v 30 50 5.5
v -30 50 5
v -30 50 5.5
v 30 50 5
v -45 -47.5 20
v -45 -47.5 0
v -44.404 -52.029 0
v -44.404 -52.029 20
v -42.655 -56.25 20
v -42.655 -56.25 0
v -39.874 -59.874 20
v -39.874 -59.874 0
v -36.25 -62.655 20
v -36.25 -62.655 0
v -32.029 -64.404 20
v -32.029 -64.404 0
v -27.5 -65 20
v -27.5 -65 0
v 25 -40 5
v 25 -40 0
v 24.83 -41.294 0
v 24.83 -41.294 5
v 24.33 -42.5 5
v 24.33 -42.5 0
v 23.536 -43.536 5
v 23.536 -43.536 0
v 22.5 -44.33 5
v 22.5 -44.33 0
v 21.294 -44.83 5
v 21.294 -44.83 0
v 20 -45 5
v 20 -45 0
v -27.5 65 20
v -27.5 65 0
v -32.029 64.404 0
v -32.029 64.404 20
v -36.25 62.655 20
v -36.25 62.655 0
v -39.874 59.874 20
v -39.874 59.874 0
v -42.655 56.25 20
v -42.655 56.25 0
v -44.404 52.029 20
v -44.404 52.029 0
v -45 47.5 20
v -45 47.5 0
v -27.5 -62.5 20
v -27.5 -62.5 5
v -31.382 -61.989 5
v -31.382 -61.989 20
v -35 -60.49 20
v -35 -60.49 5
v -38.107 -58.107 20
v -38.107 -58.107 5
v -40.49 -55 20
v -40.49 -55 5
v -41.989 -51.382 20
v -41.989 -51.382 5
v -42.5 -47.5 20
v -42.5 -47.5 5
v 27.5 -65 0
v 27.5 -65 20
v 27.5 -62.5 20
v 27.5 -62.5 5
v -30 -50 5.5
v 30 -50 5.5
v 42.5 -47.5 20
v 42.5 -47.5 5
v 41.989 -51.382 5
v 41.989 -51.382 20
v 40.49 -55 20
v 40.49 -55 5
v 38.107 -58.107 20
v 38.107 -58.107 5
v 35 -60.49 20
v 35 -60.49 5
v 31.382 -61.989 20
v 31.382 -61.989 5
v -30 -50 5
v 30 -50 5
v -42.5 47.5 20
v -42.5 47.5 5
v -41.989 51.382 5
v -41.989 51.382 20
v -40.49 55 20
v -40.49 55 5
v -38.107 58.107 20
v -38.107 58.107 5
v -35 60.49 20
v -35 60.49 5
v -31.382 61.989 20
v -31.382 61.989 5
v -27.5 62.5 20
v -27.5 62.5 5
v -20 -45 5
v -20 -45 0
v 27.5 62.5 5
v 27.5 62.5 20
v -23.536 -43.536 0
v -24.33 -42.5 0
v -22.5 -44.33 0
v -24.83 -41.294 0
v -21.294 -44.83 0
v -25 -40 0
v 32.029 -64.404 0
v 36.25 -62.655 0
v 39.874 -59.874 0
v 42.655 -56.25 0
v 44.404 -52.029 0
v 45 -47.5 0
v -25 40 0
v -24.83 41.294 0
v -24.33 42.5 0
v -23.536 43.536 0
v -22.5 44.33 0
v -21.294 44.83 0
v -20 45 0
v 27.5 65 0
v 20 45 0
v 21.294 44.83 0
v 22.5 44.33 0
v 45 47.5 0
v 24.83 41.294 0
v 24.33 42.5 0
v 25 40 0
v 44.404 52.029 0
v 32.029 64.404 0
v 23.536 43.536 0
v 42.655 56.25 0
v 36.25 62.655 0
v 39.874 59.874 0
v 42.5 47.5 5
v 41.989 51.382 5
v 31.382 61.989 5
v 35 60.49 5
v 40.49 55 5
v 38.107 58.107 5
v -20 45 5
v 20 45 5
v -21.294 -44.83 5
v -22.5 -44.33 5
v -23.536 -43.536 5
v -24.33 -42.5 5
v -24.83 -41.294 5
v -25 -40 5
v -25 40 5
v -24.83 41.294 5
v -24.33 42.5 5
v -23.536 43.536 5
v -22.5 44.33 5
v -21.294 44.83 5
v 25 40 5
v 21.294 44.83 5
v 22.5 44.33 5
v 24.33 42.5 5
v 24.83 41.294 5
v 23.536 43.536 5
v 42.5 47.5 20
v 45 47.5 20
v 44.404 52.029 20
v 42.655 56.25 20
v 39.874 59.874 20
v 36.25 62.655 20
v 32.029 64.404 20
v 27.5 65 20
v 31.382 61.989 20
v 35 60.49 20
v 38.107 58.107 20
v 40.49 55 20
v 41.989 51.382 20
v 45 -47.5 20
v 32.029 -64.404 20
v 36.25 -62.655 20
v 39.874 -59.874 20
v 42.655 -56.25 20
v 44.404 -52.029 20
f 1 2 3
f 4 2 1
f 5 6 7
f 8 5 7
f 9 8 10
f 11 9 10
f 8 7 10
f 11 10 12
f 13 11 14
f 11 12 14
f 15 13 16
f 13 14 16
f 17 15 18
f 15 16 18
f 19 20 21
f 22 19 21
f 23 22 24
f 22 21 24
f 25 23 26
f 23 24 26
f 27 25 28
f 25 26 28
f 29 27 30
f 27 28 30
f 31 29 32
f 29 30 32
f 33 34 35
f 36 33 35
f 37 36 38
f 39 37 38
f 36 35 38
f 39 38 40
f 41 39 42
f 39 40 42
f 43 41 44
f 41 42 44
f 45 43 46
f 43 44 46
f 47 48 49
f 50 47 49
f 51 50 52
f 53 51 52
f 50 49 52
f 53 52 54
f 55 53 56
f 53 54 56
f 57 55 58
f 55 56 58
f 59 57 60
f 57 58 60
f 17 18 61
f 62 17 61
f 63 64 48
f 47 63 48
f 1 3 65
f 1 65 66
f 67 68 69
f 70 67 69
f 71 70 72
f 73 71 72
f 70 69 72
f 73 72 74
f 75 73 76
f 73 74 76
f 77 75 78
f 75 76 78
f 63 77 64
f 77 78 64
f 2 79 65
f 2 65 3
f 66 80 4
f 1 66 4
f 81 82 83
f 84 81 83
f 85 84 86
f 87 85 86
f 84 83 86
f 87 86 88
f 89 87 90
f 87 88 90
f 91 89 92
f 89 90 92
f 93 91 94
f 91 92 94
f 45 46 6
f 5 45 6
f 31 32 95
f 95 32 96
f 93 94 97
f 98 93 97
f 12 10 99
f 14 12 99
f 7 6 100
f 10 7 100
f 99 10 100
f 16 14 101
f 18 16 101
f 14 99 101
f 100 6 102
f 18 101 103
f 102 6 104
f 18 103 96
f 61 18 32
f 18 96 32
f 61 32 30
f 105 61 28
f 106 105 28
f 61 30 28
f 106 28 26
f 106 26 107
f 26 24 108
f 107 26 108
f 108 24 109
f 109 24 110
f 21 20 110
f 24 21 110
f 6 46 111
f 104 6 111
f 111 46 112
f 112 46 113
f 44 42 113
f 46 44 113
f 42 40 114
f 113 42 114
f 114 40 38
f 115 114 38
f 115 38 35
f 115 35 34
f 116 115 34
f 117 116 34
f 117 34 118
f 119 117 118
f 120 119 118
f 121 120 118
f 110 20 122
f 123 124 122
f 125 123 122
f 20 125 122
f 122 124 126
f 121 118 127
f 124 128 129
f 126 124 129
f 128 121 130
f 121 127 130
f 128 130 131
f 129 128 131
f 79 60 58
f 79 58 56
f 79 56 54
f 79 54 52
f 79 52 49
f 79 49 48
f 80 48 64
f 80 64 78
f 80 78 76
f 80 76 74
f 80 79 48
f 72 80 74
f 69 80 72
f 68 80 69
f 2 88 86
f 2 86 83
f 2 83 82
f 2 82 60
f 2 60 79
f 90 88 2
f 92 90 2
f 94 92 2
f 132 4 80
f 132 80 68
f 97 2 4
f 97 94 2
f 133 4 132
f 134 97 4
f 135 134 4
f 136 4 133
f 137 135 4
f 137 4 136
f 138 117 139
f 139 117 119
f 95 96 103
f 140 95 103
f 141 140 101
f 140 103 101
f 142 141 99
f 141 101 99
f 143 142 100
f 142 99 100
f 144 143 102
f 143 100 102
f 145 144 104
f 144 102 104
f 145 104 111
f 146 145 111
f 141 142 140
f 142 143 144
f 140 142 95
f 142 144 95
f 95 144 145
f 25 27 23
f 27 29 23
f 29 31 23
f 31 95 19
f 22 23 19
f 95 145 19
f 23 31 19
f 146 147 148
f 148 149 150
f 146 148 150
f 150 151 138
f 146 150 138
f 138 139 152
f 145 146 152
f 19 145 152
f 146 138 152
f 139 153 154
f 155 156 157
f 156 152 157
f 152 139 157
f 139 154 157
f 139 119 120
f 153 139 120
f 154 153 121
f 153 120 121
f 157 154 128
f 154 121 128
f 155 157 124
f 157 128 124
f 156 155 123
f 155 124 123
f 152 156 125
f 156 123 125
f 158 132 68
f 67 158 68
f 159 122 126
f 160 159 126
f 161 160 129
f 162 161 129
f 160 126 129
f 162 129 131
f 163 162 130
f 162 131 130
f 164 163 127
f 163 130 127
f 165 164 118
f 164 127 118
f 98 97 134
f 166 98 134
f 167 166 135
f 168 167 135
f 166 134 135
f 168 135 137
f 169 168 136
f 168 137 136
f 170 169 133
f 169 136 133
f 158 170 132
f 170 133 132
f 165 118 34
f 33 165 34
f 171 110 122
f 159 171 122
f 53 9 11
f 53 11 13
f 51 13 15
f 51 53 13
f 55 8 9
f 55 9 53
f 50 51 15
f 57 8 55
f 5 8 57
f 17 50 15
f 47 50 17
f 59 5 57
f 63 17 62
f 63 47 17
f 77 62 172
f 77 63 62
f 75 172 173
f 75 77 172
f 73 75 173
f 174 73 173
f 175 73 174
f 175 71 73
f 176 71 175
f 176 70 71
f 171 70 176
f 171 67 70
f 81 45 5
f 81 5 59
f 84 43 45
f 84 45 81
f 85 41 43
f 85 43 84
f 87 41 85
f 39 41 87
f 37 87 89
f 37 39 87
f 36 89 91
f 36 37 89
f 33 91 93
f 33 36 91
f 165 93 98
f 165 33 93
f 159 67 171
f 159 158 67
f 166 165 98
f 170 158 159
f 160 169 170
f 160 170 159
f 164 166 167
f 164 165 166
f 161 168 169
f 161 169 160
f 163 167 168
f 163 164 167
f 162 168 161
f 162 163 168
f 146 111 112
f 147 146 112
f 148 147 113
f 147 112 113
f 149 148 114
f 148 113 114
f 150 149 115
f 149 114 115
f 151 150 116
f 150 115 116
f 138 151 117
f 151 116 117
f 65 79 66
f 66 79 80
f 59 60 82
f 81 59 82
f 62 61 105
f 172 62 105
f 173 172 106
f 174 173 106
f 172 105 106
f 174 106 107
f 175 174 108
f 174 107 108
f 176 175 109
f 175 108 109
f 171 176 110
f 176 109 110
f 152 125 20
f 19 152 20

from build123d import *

# Parameters (mm, degrees)
F1_DEPTH = 20
F2_DEPTH = 5
F3_W     = 60
F3_H     = 100
F4_DEPTH = 0.5


with BuildPart() as f1:
    # F0 (on Top) → F1 (new body)
    with BuildSketch(Plane.XY):
        with BuildLine():
            Line((45, -47.5), (45, 47.5))
            ThreePointArc((45, 47.5), (39.874369, 59.874369), (27.5, 65))
            Line((27.5, 65), (-27.5, 65))
            ThreePointArc((-27.5, 65), (-39.874369, 59.874369), (-45, 47.5))
            Line((-45, 47.5), (-45, -47.5))
            ThreePointArc((-45, -47.5), (-39.874369, -59.874369), (-27.5, -65))
            Line((-27.5, -65), (27.5, -65))
            ThreePointArc((27.5, -65), (39.874369, -59.874369), (45, -47.5))
        make_face()
        with BuildLine():
            Line((-27.5, 62.5), (27.5, 62.5))
            ThreePointArc((27.5, 62.5), (38.106602, 58.106602), (42.5, 47.5))
            Line((42.5, 47.5), (42.5, -47.5))
            ThreePointArc((42.5, -47.5), (38.106602, -58.106602), (27.5, -62.5))
            Line((27.5, -62.5), (-27.5, -62.5))
            ThreePointArc((-27.5, -62.5), (-38.106602, -58.106602), (-42.5, -47.5))
            Line((-42.5, -47.5), (-42.5, 47.5))
            ThreePointArc((-42.5, 47.5), (-38.106602, 58.106602), (-27.5, 62.5))
        make_face(mode=Mode.SUBTRACT)
    extrude(amount=F1_DEPTH)

    # F0 (on Top) → F2 (join)
    with BuildSketch(Plane.XY):
        with BuildLine():
            ThreePointArc((42.5, 47.5), (38.106602, 58.106602), (27.5, 62.5))
            Line((27.5, 62.5), (-27.5, 62.5))
            ThreePointArc((-27.5, 62.5), (-38.106602, 58.106602), (-42.5, 47.5))
            Line((-42.5, 47.5), (-42.5, -47.5))
            ThreePointArc((-42.5, -47.5), (-38.106602, -58.106602), (-27.5, -62.5))
            Line((-27.5, -62.5), (27.5, -62.5))
            ThreePointArc((27.5, -62.5), (38.106602, -58.106602), (42.5, -47.5))
            Line((42.5, -47.5), (42.5, 47.5))
        make_face()
        with BuildLine():
            Line((-20, 47.5), (20, 47.5))
            ThreePointArc((20, 47.5), (25.303301, 45.303301), (27.5, 40))
            Line((27.5, 40), (27.5, -40))
            ThreePointArc((27.5, -40), (25.303301, -45.303301), (20, -47.5))
            Line((20, -47.5), (-20, -47.5))
            ThreePointArc((-20, -47.5), (-25.303301, -45.303301), (-27.5, -40))
            Line((-27.5, -40), (-27.5, 40))
            ThreePointArc((-27.5, 40), (-25.303301, 45.303301), (-20, 47.5))
        make_face(mode=Mode.SUBTRACT)
        with BuildLine():
            ThreePointArc((27.5, 40), (25.303301, 45.303301), (20, 47.5))
            Line((20, 47.5), (-20, 47.5))
            ThreePointArc((-20, 47.5), (-25.303301, 45.303301), (-27.5, 40))
            Line((-27.5, 40), (-27.5, -40))
            ThreePointArc((-27.5, -40), (-25.303301, -45.303301), (-20, -47.5))
            Line((-20, -47.5), (20, -47.5))
            ThreePointArc((20, -47.5), (25.303301, -45.303301), (27.5, -40))
            Line((27.5, -40), (27.5, 40))
        make_face()
        with BuildLine():
            ThreePointArc((20, 45), (23.535534, 43.535534), (25, 40))
            Line((25, 40), (25, -40))
            ThreePointArc((25, -40), (23.535534, -43.535534), (20, -45))
            Line((20, -45), (-20, -45))
            ThreePointArc((-20, -45), (-23.535534, -43.535534), (-25, -40))
            Line((-25, -40), (-25, 40))
            ThreePointArc((-25, 40), (-23.535534, 43.535534), (-20, 45))
            Line((-20, 45), (20, 45))
        make_face(mode=Mode.SUBTRACT)
    extrude(amount=F2_DEPTH)

    # F3 (on face) → F4 (join)
    with BuildSketch(Plane.XY.offset(5)):
        Rectangle(F3_W, F3_H)
    extrude(amount=F4_DEPTH)


solid = f1.part
